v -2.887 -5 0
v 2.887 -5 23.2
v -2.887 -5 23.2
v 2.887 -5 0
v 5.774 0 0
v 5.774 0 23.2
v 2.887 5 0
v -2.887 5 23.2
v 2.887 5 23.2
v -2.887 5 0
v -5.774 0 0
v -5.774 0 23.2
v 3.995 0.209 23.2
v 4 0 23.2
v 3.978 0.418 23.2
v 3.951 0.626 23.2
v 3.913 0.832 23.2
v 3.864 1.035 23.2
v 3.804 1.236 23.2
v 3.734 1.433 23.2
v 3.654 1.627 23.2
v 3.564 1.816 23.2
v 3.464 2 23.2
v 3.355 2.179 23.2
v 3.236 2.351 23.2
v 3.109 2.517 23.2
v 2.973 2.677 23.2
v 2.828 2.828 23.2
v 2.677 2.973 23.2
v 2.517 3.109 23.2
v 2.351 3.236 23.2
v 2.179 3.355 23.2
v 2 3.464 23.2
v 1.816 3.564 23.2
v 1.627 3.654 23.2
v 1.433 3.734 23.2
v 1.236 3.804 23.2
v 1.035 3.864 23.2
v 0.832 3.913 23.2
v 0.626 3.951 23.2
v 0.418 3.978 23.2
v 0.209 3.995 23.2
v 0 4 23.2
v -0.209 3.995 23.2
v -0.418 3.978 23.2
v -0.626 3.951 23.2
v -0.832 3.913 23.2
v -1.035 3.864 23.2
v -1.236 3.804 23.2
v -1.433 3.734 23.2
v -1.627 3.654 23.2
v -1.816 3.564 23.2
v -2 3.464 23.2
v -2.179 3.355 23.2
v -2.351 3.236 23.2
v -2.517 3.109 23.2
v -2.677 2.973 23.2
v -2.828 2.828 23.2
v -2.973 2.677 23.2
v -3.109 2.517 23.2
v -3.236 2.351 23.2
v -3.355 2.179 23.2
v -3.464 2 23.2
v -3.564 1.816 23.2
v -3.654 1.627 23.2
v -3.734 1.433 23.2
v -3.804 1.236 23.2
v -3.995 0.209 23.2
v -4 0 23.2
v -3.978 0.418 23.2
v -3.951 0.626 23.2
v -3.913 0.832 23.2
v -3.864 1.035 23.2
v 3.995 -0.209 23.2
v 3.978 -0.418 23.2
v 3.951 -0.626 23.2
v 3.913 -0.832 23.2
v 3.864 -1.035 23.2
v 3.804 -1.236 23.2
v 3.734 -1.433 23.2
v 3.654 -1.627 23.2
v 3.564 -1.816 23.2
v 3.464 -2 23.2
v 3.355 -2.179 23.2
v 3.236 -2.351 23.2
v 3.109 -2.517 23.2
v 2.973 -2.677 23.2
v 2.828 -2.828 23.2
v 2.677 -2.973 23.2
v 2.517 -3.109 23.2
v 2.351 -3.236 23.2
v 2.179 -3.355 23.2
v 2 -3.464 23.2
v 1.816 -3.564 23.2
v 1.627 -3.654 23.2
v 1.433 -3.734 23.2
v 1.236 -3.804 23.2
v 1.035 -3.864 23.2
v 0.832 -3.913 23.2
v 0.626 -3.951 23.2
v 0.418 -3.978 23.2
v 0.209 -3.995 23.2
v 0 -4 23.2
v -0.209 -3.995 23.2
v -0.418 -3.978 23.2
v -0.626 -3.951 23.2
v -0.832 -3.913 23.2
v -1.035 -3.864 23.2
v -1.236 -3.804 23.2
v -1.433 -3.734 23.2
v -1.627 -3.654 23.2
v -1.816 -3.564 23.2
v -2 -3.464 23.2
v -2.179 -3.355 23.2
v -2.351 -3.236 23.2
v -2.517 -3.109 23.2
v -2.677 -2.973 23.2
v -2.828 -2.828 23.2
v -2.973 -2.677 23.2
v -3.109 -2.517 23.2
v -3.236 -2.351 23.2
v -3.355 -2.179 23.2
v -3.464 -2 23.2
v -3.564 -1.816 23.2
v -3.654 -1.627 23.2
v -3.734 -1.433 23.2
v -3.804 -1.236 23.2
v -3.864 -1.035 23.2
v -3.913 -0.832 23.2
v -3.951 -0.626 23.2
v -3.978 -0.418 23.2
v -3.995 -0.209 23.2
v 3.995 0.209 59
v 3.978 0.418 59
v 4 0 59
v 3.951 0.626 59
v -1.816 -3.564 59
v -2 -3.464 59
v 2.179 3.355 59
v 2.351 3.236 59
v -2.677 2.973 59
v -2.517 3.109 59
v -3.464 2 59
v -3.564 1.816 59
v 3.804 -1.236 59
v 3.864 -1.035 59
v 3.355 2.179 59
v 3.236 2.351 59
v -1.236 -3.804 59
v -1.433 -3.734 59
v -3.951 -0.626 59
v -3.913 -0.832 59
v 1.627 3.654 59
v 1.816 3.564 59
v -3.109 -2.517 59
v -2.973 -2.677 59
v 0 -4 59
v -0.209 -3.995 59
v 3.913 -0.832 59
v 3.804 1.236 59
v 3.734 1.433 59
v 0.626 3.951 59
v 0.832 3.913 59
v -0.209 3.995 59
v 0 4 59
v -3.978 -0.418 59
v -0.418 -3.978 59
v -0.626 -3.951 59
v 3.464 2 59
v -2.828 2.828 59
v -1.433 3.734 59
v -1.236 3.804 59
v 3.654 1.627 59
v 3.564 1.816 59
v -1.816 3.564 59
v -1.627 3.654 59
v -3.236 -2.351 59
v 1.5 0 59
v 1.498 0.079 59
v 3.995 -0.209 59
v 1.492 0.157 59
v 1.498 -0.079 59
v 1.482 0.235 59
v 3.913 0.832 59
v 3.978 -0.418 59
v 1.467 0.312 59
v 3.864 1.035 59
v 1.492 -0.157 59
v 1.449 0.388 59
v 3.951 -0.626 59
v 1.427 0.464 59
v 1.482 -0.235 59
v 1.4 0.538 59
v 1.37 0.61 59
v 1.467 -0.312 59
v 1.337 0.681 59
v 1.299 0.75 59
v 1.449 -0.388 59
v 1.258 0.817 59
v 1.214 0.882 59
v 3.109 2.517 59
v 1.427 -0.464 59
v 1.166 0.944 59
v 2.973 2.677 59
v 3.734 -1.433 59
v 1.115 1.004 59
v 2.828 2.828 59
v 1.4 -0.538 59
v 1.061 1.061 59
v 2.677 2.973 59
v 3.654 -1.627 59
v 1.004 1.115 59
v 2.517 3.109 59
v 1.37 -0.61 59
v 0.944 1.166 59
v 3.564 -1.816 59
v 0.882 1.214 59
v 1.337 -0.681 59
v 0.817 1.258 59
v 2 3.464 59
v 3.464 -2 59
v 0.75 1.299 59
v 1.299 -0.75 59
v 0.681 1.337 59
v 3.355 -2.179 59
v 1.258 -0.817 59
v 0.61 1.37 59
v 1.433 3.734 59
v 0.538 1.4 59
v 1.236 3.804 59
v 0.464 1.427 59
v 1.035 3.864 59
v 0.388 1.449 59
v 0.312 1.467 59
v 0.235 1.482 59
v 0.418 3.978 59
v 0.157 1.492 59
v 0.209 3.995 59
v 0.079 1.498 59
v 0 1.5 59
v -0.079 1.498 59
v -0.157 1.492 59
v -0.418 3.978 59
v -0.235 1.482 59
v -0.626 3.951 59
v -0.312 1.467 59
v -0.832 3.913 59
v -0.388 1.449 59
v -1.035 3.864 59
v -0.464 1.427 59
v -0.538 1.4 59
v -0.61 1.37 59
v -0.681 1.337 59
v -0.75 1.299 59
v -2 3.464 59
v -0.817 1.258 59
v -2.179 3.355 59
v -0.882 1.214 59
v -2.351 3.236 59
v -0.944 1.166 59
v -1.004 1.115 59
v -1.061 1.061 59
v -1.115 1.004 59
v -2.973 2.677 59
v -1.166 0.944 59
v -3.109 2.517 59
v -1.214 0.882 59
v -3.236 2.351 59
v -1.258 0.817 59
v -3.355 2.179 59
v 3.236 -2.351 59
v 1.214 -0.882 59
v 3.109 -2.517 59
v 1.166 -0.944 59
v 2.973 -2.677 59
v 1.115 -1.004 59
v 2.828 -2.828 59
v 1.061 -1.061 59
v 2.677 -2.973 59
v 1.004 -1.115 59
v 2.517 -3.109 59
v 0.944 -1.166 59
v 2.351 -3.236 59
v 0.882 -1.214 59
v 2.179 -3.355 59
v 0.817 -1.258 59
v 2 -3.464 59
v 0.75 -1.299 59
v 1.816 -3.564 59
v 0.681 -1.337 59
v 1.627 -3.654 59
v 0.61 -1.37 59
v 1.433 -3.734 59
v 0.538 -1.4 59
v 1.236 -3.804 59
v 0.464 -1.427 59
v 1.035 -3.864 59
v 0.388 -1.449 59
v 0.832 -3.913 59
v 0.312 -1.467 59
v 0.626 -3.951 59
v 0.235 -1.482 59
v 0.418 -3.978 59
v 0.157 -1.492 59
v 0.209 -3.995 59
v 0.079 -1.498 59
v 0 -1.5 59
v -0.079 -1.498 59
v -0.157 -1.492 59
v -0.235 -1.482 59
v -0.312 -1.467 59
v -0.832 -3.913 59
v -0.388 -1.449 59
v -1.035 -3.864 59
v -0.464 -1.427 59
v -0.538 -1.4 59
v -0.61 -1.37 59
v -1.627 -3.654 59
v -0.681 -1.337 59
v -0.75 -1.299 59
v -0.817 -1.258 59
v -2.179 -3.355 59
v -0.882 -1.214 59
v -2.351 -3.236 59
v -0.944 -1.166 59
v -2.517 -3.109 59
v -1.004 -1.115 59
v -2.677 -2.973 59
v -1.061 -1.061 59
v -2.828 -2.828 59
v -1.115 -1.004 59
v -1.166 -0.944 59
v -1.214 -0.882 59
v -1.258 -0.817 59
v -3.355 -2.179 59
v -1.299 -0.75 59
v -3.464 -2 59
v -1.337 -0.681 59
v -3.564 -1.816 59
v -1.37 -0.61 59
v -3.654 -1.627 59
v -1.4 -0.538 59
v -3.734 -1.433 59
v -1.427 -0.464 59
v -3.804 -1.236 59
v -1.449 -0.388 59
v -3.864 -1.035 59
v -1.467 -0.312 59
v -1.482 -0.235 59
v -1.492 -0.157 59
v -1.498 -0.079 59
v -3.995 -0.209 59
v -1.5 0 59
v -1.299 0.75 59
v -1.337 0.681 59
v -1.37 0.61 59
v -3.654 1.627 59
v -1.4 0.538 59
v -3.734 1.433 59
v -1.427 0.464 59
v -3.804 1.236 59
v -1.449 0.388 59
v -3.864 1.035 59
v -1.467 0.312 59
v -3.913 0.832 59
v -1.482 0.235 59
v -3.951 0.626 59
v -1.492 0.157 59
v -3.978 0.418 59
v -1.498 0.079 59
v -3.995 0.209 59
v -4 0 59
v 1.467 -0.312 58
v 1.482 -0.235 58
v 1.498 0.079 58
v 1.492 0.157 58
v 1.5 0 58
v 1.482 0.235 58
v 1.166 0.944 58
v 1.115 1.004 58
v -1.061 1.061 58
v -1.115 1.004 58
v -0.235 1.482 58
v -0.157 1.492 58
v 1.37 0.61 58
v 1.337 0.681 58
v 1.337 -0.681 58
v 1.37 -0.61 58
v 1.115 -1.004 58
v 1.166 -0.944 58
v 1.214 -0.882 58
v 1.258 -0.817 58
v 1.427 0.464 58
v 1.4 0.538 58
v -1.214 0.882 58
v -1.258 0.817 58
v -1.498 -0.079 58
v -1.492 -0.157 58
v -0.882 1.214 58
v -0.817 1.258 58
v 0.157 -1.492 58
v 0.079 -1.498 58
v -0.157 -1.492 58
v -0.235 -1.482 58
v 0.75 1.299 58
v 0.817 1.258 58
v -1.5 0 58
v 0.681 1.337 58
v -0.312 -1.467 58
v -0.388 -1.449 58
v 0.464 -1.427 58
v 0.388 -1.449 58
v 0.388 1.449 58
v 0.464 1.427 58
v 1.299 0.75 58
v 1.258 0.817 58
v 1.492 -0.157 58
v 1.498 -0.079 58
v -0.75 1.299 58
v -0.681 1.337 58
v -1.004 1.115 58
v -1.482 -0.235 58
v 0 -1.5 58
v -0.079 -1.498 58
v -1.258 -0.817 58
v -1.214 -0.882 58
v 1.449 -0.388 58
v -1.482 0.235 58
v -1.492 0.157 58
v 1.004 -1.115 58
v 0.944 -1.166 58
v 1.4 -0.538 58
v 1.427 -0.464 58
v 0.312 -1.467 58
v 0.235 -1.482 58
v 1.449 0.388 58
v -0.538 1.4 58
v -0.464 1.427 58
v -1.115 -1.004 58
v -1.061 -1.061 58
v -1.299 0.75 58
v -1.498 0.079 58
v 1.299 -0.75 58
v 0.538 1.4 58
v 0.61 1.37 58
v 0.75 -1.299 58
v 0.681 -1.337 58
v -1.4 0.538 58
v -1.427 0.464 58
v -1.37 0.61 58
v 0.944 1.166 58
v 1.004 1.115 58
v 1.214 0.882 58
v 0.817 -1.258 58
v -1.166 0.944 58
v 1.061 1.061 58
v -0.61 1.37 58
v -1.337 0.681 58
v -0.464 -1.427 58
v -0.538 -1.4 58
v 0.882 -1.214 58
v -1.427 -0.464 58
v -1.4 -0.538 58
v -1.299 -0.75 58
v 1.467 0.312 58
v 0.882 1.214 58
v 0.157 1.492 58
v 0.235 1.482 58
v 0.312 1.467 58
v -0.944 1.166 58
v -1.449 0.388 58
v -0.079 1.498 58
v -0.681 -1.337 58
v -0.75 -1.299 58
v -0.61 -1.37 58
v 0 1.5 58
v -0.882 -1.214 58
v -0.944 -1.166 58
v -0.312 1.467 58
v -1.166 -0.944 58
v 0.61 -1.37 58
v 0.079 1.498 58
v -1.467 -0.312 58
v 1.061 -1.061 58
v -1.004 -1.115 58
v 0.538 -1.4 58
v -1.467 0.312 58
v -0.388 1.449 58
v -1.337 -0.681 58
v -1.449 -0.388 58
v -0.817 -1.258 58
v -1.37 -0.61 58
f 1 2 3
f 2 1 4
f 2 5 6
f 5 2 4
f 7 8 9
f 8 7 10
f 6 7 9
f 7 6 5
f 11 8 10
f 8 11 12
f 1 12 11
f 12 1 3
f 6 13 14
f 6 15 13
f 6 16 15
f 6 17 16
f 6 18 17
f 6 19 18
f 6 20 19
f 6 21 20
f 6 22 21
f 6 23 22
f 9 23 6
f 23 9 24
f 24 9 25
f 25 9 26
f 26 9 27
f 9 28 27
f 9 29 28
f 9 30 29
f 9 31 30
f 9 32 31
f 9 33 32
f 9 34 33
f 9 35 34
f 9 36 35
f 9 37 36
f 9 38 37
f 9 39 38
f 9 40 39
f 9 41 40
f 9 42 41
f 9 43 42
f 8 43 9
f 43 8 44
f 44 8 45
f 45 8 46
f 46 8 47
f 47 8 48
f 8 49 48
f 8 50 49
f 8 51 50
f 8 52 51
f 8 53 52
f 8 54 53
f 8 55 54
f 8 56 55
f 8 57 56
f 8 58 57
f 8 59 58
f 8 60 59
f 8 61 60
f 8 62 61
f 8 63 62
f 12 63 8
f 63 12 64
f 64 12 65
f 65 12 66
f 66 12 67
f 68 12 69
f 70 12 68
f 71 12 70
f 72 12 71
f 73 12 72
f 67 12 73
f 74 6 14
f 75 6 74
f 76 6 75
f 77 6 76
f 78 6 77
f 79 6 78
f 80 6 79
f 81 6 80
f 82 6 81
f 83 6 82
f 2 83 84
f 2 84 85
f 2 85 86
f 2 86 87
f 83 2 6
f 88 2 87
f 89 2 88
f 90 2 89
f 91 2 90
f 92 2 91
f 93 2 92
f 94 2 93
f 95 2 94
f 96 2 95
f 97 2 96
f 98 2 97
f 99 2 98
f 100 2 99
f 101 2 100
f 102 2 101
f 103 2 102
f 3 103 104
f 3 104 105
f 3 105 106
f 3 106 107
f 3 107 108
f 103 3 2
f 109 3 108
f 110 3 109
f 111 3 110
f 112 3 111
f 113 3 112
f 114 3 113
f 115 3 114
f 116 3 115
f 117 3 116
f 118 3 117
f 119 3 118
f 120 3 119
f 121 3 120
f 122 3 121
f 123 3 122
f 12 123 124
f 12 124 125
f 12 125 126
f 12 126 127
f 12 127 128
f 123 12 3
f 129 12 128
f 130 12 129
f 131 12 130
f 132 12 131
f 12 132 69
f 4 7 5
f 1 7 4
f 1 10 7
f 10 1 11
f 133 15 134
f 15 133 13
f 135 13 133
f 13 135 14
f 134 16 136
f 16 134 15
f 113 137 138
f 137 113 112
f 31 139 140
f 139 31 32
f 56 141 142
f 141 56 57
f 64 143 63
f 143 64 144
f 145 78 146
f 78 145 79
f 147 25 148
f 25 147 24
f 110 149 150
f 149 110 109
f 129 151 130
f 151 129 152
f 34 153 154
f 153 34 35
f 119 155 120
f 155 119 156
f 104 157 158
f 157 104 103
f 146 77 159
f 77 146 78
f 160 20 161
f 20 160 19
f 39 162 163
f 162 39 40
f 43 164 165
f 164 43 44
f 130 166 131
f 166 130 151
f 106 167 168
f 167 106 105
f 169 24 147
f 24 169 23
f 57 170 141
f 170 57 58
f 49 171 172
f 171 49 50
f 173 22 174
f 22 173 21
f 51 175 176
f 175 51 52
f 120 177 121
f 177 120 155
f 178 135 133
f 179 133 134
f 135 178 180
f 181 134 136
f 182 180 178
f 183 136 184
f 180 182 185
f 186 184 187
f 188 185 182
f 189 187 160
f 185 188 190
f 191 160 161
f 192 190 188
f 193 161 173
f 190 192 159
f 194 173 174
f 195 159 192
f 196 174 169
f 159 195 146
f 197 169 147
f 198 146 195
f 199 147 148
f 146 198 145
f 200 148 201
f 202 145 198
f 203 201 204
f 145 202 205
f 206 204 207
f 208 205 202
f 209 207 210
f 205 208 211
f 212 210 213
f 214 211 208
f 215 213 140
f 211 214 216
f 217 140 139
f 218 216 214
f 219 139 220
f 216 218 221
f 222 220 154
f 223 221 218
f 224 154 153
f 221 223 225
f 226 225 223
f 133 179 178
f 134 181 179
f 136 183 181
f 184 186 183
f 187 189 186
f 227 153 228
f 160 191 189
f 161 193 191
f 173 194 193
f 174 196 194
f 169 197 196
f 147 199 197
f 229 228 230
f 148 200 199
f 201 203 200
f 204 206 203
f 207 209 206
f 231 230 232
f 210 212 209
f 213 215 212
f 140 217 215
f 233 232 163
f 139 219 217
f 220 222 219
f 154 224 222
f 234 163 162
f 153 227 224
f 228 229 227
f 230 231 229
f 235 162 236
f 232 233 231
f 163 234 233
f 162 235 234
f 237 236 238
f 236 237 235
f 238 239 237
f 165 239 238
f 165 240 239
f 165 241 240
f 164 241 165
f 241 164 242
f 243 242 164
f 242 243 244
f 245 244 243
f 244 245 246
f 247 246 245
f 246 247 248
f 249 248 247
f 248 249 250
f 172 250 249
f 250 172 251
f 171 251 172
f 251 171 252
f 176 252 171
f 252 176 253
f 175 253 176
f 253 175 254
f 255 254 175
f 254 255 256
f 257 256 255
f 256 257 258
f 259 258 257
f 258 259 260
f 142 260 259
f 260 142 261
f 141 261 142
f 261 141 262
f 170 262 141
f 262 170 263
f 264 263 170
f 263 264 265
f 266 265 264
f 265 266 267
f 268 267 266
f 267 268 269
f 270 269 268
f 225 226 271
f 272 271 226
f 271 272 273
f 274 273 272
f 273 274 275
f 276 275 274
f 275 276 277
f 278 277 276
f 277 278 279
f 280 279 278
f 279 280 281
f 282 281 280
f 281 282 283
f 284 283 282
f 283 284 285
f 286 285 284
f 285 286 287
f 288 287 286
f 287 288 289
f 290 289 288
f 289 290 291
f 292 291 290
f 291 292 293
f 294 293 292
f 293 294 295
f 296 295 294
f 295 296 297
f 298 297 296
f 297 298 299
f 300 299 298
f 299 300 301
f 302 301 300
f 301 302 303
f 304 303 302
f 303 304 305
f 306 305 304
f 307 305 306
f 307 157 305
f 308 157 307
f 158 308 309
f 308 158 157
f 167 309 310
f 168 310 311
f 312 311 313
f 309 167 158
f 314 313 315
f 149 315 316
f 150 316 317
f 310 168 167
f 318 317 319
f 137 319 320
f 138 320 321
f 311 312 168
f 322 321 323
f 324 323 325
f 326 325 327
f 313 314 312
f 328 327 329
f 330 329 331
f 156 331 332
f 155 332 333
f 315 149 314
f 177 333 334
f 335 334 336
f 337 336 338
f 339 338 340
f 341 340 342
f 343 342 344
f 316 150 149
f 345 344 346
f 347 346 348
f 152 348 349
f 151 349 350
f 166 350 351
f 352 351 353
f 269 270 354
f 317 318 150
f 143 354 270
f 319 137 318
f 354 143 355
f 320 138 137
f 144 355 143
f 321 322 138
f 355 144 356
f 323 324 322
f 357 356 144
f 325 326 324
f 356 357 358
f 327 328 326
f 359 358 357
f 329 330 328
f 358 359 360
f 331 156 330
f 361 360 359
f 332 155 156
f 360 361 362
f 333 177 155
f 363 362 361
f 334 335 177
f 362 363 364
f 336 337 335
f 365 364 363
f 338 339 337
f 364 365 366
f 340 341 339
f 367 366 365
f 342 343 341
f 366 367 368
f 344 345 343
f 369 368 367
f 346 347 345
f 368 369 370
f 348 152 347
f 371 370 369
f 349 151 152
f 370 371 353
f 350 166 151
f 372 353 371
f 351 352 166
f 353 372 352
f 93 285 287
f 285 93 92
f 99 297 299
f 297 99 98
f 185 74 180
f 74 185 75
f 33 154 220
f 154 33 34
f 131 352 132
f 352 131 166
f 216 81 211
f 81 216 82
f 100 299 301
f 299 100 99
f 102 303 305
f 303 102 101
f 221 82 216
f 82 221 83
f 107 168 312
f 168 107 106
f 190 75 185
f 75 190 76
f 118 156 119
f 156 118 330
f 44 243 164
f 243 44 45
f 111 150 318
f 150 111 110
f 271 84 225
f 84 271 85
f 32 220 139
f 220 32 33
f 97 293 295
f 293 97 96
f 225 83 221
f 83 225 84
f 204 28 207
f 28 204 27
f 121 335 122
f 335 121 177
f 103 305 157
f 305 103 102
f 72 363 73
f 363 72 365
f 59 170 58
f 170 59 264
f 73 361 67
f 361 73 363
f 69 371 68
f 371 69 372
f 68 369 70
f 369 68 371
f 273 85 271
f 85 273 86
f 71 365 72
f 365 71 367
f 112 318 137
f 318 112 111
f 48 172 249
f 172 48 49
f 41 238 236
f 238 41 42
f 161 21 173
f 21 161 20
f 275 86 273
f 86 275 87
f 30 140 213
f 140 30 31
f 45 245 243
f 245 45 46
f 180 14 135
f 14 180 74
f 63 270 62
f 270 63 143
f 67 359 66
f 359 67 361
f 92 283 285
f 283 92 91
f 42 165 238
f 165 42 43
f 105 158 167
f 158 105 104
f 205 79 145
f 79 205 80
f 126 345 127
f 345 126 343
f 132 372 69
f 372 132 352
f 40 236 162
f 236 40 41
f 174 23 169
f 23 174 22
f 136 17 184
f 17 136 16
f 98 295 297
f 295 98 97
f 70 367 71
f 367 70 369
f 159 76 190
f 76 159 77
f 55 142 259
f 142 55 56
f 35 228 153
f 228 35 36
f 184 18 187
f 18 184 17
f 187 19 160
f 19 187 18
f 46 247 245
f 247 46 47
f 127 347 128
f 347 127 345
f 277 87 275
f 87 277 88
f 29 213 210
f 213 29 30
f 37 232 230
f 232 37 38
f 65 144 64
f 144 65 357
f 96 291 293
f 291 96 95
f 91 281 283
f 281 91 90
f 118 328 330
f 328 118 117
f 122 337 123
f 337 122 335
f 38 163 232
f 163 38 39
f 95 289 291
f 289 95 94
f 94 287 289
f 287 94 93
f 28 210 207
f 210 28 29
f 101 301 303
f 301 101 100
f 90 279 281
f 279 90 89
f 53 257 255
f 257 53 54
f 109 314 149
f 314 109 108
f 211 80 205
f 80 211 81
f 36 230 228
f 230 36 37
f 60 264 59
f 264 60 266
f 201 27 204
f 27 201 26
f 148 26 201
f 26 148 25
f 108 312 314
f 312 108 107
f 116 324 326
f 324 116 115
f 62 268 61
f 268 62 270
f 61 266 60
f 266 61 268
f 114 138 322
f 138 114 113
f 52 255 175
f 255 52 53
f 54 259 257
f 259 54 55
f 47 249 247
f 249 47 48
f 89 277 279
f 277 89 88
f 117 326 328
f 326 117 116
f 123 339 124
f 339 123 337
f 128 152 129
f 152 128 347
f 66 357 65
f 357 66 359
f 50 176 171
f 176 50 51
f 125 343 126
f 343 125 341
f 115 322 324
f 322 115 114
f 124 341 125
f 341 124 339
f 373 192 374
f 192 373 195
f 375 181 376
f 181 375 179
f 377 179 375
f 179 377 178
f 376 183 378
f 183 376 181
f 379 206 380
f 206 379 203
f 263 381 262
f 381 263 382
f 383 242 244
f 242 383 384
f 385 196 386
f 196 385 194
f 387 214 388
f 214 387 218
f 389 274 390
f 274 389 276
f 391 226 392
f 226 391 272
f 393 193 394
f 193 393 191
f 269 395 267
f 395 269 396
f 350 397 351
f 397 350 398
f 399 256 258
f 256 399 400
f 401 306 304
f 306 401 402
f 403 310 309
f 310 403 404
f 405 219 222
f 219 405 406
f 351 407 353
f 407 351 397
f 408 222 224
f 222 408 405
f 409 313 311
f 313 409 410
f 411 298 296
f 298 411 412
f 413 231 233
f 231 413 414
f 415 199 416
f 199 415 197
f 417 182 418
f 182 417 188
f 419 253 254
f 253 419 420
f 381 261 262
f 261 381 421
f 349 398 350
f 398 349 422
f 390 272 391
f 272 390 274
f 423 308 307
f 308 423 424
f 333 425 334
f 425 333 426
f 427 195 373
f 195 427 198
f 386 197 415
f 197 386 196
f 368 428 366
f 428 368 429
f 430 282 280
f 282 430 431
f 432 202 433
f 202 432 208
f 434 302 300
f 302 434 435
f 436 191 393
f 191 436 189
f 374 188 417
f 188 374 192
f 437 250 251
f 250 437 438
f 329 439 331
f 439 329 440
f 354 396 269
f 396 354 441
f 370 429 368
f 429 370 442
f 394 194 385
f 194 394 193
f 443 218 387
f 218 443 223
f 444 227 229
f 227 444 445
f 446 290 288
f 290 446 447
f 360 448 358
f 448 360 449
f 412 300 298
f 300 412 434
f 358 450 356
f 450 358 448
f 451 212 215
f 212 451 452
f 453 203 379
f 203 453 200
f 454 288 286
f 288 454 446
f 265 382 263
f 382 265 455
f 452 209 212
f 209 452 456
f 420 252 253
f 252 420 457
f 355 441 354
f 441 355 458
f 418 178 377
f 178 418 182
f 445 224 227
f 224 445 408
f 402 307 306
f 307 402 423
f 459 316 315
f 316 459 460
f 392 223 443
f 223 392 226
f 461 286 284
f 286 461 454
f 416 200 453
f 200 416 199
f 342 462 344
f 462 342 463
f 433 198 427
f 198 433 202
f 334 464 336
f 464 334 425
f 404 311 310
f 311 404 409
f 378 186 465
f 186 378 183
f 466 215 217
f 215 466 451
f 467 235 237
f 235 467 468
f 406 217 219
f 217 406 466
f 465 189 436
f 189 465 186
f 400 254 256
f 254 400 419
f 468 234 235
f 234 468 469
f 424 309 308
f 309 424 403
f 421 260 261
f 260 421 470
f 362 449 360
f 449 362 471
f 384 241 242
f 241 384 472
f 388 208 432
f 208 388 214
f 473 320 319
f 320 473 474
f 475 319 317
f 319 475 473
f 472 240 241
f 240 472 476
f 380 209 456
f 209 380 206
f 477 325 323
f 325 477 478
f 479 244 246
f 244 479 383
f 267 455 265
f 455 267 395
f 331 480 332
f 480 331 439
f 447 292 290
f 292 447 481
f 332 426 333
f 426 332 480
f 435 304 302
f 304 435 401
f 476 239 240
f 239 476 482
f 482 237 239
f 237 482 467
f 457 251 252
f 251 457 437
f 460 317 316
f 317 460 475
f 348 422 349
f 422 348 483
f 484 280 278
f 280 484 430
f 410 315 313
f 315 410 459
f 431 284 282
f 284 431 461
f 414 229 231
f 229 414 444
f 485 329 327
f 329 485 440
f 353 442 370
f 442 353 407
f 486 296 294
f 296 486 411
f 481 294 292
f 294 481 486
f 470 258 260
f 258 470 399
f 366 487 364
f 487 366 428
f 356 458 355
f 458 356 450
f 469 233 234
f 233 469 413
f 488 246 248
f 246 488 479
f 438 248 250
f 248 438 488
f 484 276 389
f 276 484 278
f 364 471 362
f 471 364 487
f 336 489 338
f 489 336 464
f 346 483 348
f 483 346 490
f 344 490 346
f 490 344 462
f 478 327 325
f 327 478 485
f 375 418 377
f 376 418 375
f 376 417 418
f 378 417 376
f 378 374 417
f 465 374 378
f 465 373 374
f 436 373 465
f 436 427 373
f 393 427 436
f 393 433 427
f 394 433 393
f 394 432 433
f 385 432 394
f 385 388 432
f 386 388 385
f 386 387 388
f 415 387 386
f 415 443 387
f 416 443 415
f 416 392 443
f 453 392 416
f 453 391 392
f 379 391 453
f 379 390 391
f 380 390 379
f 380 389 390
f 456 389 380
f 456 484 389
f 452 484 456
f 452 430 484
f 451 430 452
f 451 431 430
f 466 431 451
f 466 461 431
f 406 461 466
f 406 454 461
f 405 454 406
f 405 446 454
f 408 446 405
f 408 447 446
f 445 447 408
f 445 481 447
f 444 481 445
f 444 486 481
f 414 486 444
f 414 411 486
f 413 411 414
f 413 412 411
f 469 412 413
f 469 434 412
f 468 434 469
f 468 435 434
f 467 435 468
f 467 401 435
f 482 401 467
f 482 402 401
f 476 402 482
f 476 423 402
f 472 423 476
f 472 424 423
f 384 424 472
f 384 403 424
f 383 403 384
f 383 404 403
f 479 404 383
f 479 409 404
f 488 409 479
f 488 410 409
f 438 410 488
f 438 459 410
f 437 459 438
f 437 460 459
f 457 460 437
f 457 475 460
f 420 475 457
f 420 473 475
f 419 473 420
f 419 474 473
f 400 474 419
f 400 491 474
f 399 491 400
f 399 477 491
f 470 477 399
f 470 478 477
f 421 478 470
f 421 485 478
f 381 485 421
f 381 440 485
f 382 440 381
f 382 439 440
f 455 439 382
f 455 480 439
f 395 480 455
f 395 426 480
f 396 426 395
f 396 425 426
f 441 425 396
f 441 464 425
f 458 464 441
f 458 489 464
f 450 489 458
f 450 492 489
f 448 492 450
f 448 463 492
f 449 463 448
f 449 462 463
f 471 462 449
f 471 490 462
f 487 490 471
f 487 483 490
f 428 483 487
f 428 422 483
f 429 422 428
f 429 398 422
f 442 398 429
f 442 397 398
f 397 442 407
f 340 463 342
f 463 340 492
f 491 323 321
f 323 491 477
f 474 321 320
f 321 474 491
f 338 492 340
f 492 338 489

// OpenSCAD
// ==========================================================================
//  GENERATED FILE -- DO NOT EDIT.
//  Produced by build/build.py from components/Bottle_Hex_Shaft.scad
//  Turtle Body version 2.3.1
//  Edit lib/ and src/ instead, then run: python3 build/build.py
// ==========================================================================
/*
 Hope Turtle — round/hex centre axle. Units: mm. License: CERN-OHL-S-2.0.
 Hex end on Z=0 for printing; the magnet recess opens upward.
 Round section = 30 mm inside the cavity (incl. boss) + 5 mm cap roof (TB-03)
 + 1 mm proud. Overall length 59 mm.

 SOURCE FILE — geometry lives in lib/hex_shaft.scad + lib/params.scad.
 The committed self-contained file is generated by build/build.py.
*/

/* [Round shaft] */
round_shaft_diameter = 8;
round_length_inside_cap = 30; // roof underside -> round end, INCLUDING the boss
round_extension_above_cap = 1;

/* [Hex shaft] */
hex_across_flats = 10;
hex_length = 23;
joining_overlap = 0.2;

/* [Magnet recess] */
magnet_recess_enabled = true;
magnet_diameter = 3;
magnet_thickness = 1;

/* [Render] */
fn = 120; // [48:8:240]

// [bundle] begin use <../../lib/hex_shaft.scad>
// ==========================================================================
//  Turtle Body -- round / hex centre axle  (lib module)
// --------------------------------------------------------------------------
//  Round section bears in the cap; hex section drives the cage and passes
//  through the sail bar. Magnet recess opens at the round end for an AS5600
//  sensing magnet. See CLAUDE.md s9.
//
//  TB-04: derived to the resolved 5 mm cap roof (TB-03). The round section
//  spans `round_inside_cap` (roof underside -> round end, 30 mm, INCLUDING
//  the boss -- do not add the boss again) + the 5 mm roof + 1 mm proud, so
//  the round end still sits 1 mm above the cap's outer face and the overall
//  axle is 59 mm (was 58 mm at the stale 4 mm roof).
//
//  Definitions only. Geometry is emitted by control_axle().
// ==========================================================================

// [bundle] begin use <params.scad>
// ==========================================================================
//  Turtle Body -- shared dimension contract
// --------------------------------------------------------------------------
//  The single source of truth for every dimension that more than one
//  subsystem depends on. Values are exposed as zero-argument functions so
//  this file can be pulled in with `use <params.scad>` (which ignores
//  top-level variable assignments) without polluting any namespace.
//
//  lib/ modules take these as DEFAULT argument values:
//      module control_cap(roof_t = p_cap_roof_t(), ...) { ... }
//  so a src/ wrapper can still override one value from its customizer block
//  while every other subsystem keeps the shared number.
//
//  Rules:
//   * one function per concept, canonical name (see CLAUDE.md cross-file table)
//   * derived values are functions of other p_*() functions, never re-typed
//   * mm throughout; names say _d (diameter), _r (radius), _t (thickness),
//     _len / _h (axial), _af (hex across-flats)
//   * do NOT add a bare `x = ...;` here -- bundle.py / lint.py will reject it
// ==========================================================================

// ---- tolerances and render quality --------------------------------------
function p_eps()          = 0.02;   // Boolean overlap / cut-through fudge
function p_fit_clearance() = 0.2;   // wood joint: TOTAL extra slot width, centred on the board
function p_fn_plastic()   = 120;    // printed PLA parts (cap, cage, axle, mold)
function p_fn_wood()      = 96;     // cut wooden parts
function p_fn_curve()     = 180;    // fine profile curves (bottle, sails)

// ---- bottle (the foundation reference) ---------------------------------
function p_bottle_d()        = 86;    // outside diameter (was 82; other bottle dims held)
function p_bottle_h()        = 305;   // total height incl. ordinary screw cap
function p_bottle_wall_t()   = 0.5;   // modelling assumption, not a measurement
function p_bottle_cap_d()    = 31;    // ordinary screw cap (NOT the control-cap disk)
function p_bottle_cap_h()    = 17;    // ordinary screw cap height (rear-fin / ballast formulas)
function p_collar_d()        = 34;    // bottle collar, independent of cap diameter
function p_top_dome_h()      = 62;
function p_bottom_dome_h()   = 25;
function p_dome_power()      = 2.5;   // superellipse exponent
function p_bottle_neck_h()   = 5;
function p_bottle_collar_h() = 1;
function p_bottle_neck_d()   = p_bottle_cap_d() - 3;   // 28: neck is 3 mm under the cap
function p_bottle_base_ratio() = 0.88; // slightly narrower footprint at the base
function p_bottle_profile_steps() = 16;
// cut bottle (control head): the lower dome is removed and a short socket is
// bored so the control-cap insert slides in. Cut plane sits 5 mm above the
// bottom dome height.
function p_bottle_cut_extra()  = 5;
function p_bottle_cut_height() = p_bottom_dome_h() + p_bottle_cut_extra();   // 30

// nominal bottle interior and the cap insert that enters it
function p_bottle_socket_d() = p_bottle_d() - 2 * p_bottle_wall_t();          // 81
function p_insert_shaft_radial_clearance() = 1;
function p_insert_shaft_d()  = p_bottle_socket_d()
                             - 2 * p_insert_shaft_radial_clearance();          // 79

// ---- wooden stock -----------------------------------------------------
function p_wood_t()          = 12;    // shared board / slat thickness
function p_fin_board_w()     = 93;    // shared fin-system stock width
function p_screw_side_offset() = 25;  // mounting-hole inset from a John end

// ---- Ecojoiner port --------------------------------------------------
// A port must swallow the bottle's tapered top (the top dome) plus a seating
// allowance, so its axial length is DERIVED from the bottle, not fixed. This
// is the same rule the HopeTurtles.org generators use
// (port_length = taper_height + port_allowance); until 2026-09-08 lib carried
// the evaluated constant 82 instead, which silently broke the rule for any
// bottle other than the reference one. Ballast and Ecojoiner both read it.
function p_port_allowance()  = 20;                 // seating allowance beyond the dome
function p_port_length()     = p_top_dome_h() + p_port_allowance();   // 62 + 20 = 82
function p_port_height()     = p_bottle_d();       // opening height == bottle diameter (asserted)

// ---- M6 hardware ---------------------------------------------------
function p_m6_clearance_d()  = 6.4;   // M6 clearance hole
function p_m6_bolt_shaft_d() = 6;     // visual placeholder only
function p_m6_bolt_head_d()  = 12;
function p_m6_bolt_head_t()  = 4;

// ---- control cap (large stationary disk; see CLAUDE.md s7) ----------
//  TB-03 resolution: repository 5 mm roof / 2 mm boss is authoritative;
//  the axle (below) is derived to this datum.
function p_cap_disk_d()      = 100;   // control-cap disk (independent of p_bottle_cap_d)
function p_cap_roof_t()      = 5;     // disk / roof thickness
function p_cap_boss_depth()  = 1.5;   // extra projection of the centre boss into the hollow cap
                                       // (was 2; lowered 0.5 mm -> 6.5 mm axle bearing length)
function p_cap_boss_d()      = 18;
function p_cap_insert_len()  = 35;    // straight insert shaft length
function p_cap_insert_wall_t() = 4;
function p_cap_entry_chamfer_h()     = 1;
function p_cap_entry_chamfer_delta() = 1;
function p_cap_axle_bore_d() = 8.7;   // 0.35 mm radial clearance to the Ø8 shaft (was 8.6 / 0.3 mm)
function p_cap_cage_radial_clearance() = 1;   // cap disk -> cage inner wall (radial)
function p_cap_total_h()     = p_cap_roof_t() + p_cap_insert_len();           // 40
function p_cap_bearing_len() = p_cap_roof_t() + p_cap_boss_depth();           // 6.5 (was 7)

// buttons (through both cap and cage)
function p_button_upper_d()  = 17;    // clearance hole in the cap
function p_button_axis()     = "y";   // "x" or "y"
function p_button_radius()   = 25;    // radial position of the two button centres (50 mm apart;
                                       // was 24 / 48 mm -- shared with the cage's matching bore)

// ---- silicone seal grooves + rings (CLAUDE.md s8) ------------------
function p_seal_groove_count()      = 2;
function p_seal_groove_axial_h()    = 2.7; // groove height (was 3.5; retuned to just clear
                                            // the 2.6 mm ring axial thickness below, 0.1 mm margin)
function p_seal_groove_radial_depth() = 2; // groove depth
function p_seal_groove1_from_shoulder() = 12;  // groove centre, measured from the insert SHOULDER
function p_seal_groove2_from_shoulder() = 25;
function p_seal_ring_axial_t()      = 2.6;  // cast ring thickness (was 3)
function p_seal_ring_radial_w()     = 10;   // cast ring radial width (was 5; doubled). NOT validated.
function p_seal_ring_elasticity_reduction() = 0.25;
    // Cast the ring's inner diameter this fraction SMALLER than the groove
    // root it mates to, so real (stretchy) silicone is under tension --
    // and therefore actually grips -- once stretched onto the cap, instead
    // of sitting at a 1:1 as-cast fit. Tweak this here as real silicone
    // behaviour is characterized; NOT validated (see lib/silicone_ring_mold.scad).
function p_seal_groove_root_d() = p_insert_shaft_d()
                                - 2 * p_seal_groove_radial_depth();            // 79 at the 86 mm bottle

// ---- round / hex centre axle (CLAUDE.md s9) -----------------------
//  Derived to the 5/2 cap datum (TB-03/TB-04). round_inside_cap is measured
//  from the roof underside and INCLUDES the boss -- do not add the boss again.
function p_axle_round_d()        = 8;
function p_axle_round_ext()      = 1;    // projection above the cap's outer face
function p_axle_round_inside_cap() = p_cap_insert_len() - 5;  // 30: roof underside to round end (incl. boss)
function p_axle_round_len()      = p_axle_round_inside_cap() + p_cap_roof_t() + p_axle_round_ext();  // 36
function p_axle_hex_af()         = 10.0; // shaft across-flats (0.3 mm to the Ø10.3 cage bore)
function p_axle_hex_len()        = 23;
function p_axle_join_overlap()   = 0.2;  // hex<->round Boolean overlap
function p_axle_total_len()      = p_axle_hex_len() + p_axle_round_len();
function p_axle_hex_corner_d()   = p_axle_hex_af() / cos(30);                  // ~11.55
function p_magnet_d()            = 3;    // AS5600 sensing magnet recess
function p_magnet_t()            = 1;

// ---- axle rotary shaft O-ring (waterproofs the axle bore; cast in the mold) ----
//  A round-section O-ring seated in a gland in the control-cap bore, sealing
//  against the spinning round section of the axle. ID is tied to the shaft.
function p_axle_oring_cs()     = 2.0;                                   // cross-section
function p_axle_oring_id()     = p_axle_round_d();                      // 8 -- hugs the shaft
function p_axle_oring_od()     = p_axle_oring_id() + 2 * p_axle_oring_cs();          // 12
function p_axle_oring_mean_r() = (p_axle_oring_id() + p_axle_oring_cs()) / 2;        // 5
//  gland cut into the cap bore for it
function p_cap_oring_squeeze()      = 0.25;  // radial squeeze on the seal
function p_cap_oring_gland_od()     = p_axle_oring_od() - 2 * p_cap_oring_squeeze(); // 11.5
function p_cap_oring_gland_w()      = 1.3 * p_axle_oring_cs();                       // 2.6 axial
function p_cap_oring_gland_from_face() = 3.5; // gland centre, from the cap outer face, along the bore

// ---- rotating control cage (CLAUDE.md s6) ------------------------
function p_cage_wall_t()     = 6.5;   // radial wall thickness
function p_cage_roof_t()     = 4;     // roof / surface plate thickness
function p_cage_inner_d()    = p_cap_disk_d() + 2 * p_cap_cage_radial_clearance();   // 102
function p_cage_outer_d()    = p_cage_inner_d() + 2 * p_cage_wall_t();               // 115
function p_cage_skirt_depth()   = 44;   // roof underside to the ORIGINAL skirt rim
function p_cage_peak_extension() = 20;  // crest extends this far past the original rim
function p_cage_valley_wall_h()  = 10;  // minimum wall depth between mounts
function p_cage_total_h()    = p_cage_skirt_depth() + p_cage_roof_t();              // 48 (native)
function p_cage_notch_count()   = 4;
function p_cage_notch_w()    = 22.5;  // batten groove width
function p_cage_notch_depth() = 3.7;
function p_cage_wave_segments() = 240;
function p_cage_hub_d()      = 29;
function p_cage_pocket_d()   = 26;    // top clip pocket (control_cage top_pocket, OFF by default)
function p_cage_pocket_depth() = 4;   //   "        "     "
function p_cage_hex_bore_af() = 10.3; // central hex bore (0.3 mm to the Ø10.0 shaft)
function p_cage_bearing_d()  = 9;     // hemispherical bearing bump
function p_cage_bearing_count() = 8;
function p_cage_bearing_pcd() = p_cap_disk_d() - p_cage_bearing_d() + 0.5;          // 91.5
function p_cage_top_hole_d() = 18;    // central button / access hole through the roof
function p_cage_mount_hole_d() = 3.2; // two M3 clearance holes per batten / groove
function p_cage_mount_pitch()  = 32;  // vertical pitch of the pair
function p_cage_lower_hole_from_tip() = 10;
// 45-deg outward chamfer on the roof-top outer edge (0 = sharp). The cage
// prints roof-face-down, so this bevel flares OUT from the bed and stays
// printable; it runs the full perimeter, batten grooves included. See
// lib/control_cage.scad.
function p_cage_roof_bevel() = 3;

// ---- sail apparatus (CLAUDE.md s10) ---------------------------
function p_side_batten_h()   = 205;
function p_side_batten_w()   = 20;
function p_side_batten_radial_t() = 10;
function p_top_crossbar_len() = 6 * p_bottle_d();   // 492
function p_top_crossbar_w()  = 22;
function p_top_crossbar_t()  = p_wood_t();          // 12
function p_sail_bar_axle_hole_d() = 12;             // Ø12; fits the ~11.55 hex corner dia
function p_bottom_rail_len() = 3 * p_bottle_d();    // 246
function p_bottom_rail_bottle_clearance() = 1;
function p_sail_rail_color()  = [0.56, 0.39, 0.39]; // brown (top AND bottom rails)
function p_c_piece_color()    = [1.0, 0.52, 0.20];  // orange, retained

// ---- rear fin + solar support (CLAUDE.md s11) ----------------
function p_solar_panel_w() = 148;
function p_solar_panel_h() = 223;
function p_solar_panel_t() = 2.5;    // real panel, independent of wood thickness
function p_rear_shaft_len() = p_bottle_h()
                            + (2/3) * (p_fin_board_w() - 2 * p_wood_t())
                            - p_bottle_cap_h();                                 // 334
function p_rear_half_lap_engagement() = 42;   // green/yellow interlock depth
function p_rear_fin_tab_width() = 15;
function p_rear_shaft_width()   = 59;
// TB-07: the green-slat mounting hole follows the mating Ecojoiner John, not a
// fixed 50 mm. Derived from the install transform; the john_length/2 terms
// cancel, leaving a pure function of the shared contract (= 103 at defaults).
function p_rear_shaft_hole_from_front() =
    p_rear_shaft_len() - p_screw_side_offset() - p_bottle_h()
    + p_bottle_cap_h() + p_port_height();

// ---- ballast attachment (CLAUDE.md s12) ---------------------
function p_ballast_core_w()   = p_bottle_d() - 2 * p_wood_t();                  // 58
function p_ballast_core_len() = p_bottle_h() - p_bottle_cap_h() + 6 * p_wood_t();  // 360
function p_ballast_slat_gap() = p_bottle_d();          // clear inner-face gap
function p_ballast_slat_spacing() = p_bottle_d() + p_wood_t();                  // 94
function p_ballast_board_len() = 3.5 * p_bottle_d();   // 287
function p_ballast_fin_len()   = 3 * p_bottle_d();     // 246
function p_ballast_lock_w()    = 5 * p_wood_t();       // 60

// ---- neutral wood shades (used when enable_color_coding = false) -------
// With the full colour code off, every wooden subsystem still renders in its
// OWN shade of brown so the parts stay visually separable. All are warm browns
// (R > G > B) spaced by lightness. The two large fins share one darker shade so
// they read as a matched pair, distinct from the rest of their own assembly.
function p_wood_shade_sail()     = [0.85, 0.66, 0.47]; // sail frame  (lightest)
function p_wood_shade_rear_fin() = [0.72, 0.50, 0.33]; // rear-fin shafts + solar holder
function p_wood_shade_eco()      = [0.62, 0.44, 0.28]; // Ecojoiner core
function p_wood_shade_ballast()  = [0.52, 0.34, 0.22]; // ballast slats / board / locks
function p_wood_shade_fin()      = [0.40, 0.26, 0.17]; // rear fin + ballast fin, shared (darkest)
// [bundle] end   <params.scad>

module control_axle(round_d        = p_axle_round_d(),
                    round_inside_cap = p_axle_round_inside_cap(),  // 30, roof underside -> round end
                    round_ext      = p_axle_round_ext(),           // 1, proud of the cap face
                    cap_roof_t     = p_cap_roof_t(),               // 5 (TB-03)
                    hex_af         = p_axle_hex_af(),
                    hex_len        = p_axle_hex_len(),
                    join_overlap   = p_axle_join_overlap(),
                    magnet         = true,
                    magnet_d       = p_magnet_d(),
                    magnet_t       = p_magnet_t(),
                    fn             = undef) {
    nn        = fn == undef ? p_fn_plastic() : fn;
    hex_cd    = hex_af / cos(30);
    round_len = round_inside_cap + cap_roof_t + round_ext;
    total_len = hex_len + round_len;

    // ---- interface asserts (inputs from the shared contract) ----
    assert(round_d > 0 && round_d < p_cap_axle_bore_d(),
           "control_axle: round shaft must clear the cap bore.");
    assert(hex_af > round_d && hex_af < p_cage_hex_bore_af(),
           "control_axle: hex across-flats must sit between round dia and cage bore.");
    assert(hex_cd < p_sail_bar_axle_hole_d(),
           "control_axle: hex corners must fit the sail-bar axle hole.");
    assert(join_overlap > 0 && join_overlap < min(hex_len, round_len));
    assert(round_inside_cap > 0 && cap_roof_t > 0 && round_ext >= 0);
    assert(round_inside_cap > p_cap_boss_depth(),
           "control_axle: round section must pass the boss.");
    assert(round_inside_cap < p_cap_insert_len(),
           "control_axle: keep the round end inside the cap's open insert rim.");
    assert(hex_len + round_ext >
           p_cage_bearing_d() / 2 + p_cage_roof_t() + p_top_crossbar_t(),
           "control_axle: axle must reach through the cage roof and sail bar.");
    assert(!magnet || (magnet_d > 0 && magnet_d < round_d
           && magnet_t > 0 && magnet_t < round_inside_cap));

    $fn = nn;
    difference() {
        union() {
            cylinder(d = hex_cd, h = hex_len + join_overlap, $fn = 6);
            translate([0, 0, hex_len - join_overlap])
                cylinder(d = round_d, h = round_len + join_overlap);
        }
        if (magnet)
            translate([0, 0, total_len - magnet_t])
                cylinder(d = magnet_d, h = magnet_t + p_eps());
    }

    echo("AXLE: total / round / hex length = ", total_len, round_len, hex_len);
    echo("AXLE: round dia / hex across flats / hex corners = ", round_d, hex_af, hex_cd);
}

// Print pose: hex end already on Z=0, magnet opening up -- this is the
// as-modelled orientation, so no reseat module is needed.
// [bundle] end   <../../lib/hex_shaft.scad>

color([0.74, 0.77, 0.79])
control_axle(round_d          = round_shaft_diameter,
             round_inside_cap = round_length_inside_cap,
             round_ext        = round_extension_above_cap,
             hex_af           = hex_across_flats,
             hex_len          = hex_length,
             join_overlap     = joining_overlap,
             magnet           = magnet_recess_enabled,
             magnet_d         = magnet_diameter,
             magnet_t         = magnet_thickness,
             fn               = fn);
